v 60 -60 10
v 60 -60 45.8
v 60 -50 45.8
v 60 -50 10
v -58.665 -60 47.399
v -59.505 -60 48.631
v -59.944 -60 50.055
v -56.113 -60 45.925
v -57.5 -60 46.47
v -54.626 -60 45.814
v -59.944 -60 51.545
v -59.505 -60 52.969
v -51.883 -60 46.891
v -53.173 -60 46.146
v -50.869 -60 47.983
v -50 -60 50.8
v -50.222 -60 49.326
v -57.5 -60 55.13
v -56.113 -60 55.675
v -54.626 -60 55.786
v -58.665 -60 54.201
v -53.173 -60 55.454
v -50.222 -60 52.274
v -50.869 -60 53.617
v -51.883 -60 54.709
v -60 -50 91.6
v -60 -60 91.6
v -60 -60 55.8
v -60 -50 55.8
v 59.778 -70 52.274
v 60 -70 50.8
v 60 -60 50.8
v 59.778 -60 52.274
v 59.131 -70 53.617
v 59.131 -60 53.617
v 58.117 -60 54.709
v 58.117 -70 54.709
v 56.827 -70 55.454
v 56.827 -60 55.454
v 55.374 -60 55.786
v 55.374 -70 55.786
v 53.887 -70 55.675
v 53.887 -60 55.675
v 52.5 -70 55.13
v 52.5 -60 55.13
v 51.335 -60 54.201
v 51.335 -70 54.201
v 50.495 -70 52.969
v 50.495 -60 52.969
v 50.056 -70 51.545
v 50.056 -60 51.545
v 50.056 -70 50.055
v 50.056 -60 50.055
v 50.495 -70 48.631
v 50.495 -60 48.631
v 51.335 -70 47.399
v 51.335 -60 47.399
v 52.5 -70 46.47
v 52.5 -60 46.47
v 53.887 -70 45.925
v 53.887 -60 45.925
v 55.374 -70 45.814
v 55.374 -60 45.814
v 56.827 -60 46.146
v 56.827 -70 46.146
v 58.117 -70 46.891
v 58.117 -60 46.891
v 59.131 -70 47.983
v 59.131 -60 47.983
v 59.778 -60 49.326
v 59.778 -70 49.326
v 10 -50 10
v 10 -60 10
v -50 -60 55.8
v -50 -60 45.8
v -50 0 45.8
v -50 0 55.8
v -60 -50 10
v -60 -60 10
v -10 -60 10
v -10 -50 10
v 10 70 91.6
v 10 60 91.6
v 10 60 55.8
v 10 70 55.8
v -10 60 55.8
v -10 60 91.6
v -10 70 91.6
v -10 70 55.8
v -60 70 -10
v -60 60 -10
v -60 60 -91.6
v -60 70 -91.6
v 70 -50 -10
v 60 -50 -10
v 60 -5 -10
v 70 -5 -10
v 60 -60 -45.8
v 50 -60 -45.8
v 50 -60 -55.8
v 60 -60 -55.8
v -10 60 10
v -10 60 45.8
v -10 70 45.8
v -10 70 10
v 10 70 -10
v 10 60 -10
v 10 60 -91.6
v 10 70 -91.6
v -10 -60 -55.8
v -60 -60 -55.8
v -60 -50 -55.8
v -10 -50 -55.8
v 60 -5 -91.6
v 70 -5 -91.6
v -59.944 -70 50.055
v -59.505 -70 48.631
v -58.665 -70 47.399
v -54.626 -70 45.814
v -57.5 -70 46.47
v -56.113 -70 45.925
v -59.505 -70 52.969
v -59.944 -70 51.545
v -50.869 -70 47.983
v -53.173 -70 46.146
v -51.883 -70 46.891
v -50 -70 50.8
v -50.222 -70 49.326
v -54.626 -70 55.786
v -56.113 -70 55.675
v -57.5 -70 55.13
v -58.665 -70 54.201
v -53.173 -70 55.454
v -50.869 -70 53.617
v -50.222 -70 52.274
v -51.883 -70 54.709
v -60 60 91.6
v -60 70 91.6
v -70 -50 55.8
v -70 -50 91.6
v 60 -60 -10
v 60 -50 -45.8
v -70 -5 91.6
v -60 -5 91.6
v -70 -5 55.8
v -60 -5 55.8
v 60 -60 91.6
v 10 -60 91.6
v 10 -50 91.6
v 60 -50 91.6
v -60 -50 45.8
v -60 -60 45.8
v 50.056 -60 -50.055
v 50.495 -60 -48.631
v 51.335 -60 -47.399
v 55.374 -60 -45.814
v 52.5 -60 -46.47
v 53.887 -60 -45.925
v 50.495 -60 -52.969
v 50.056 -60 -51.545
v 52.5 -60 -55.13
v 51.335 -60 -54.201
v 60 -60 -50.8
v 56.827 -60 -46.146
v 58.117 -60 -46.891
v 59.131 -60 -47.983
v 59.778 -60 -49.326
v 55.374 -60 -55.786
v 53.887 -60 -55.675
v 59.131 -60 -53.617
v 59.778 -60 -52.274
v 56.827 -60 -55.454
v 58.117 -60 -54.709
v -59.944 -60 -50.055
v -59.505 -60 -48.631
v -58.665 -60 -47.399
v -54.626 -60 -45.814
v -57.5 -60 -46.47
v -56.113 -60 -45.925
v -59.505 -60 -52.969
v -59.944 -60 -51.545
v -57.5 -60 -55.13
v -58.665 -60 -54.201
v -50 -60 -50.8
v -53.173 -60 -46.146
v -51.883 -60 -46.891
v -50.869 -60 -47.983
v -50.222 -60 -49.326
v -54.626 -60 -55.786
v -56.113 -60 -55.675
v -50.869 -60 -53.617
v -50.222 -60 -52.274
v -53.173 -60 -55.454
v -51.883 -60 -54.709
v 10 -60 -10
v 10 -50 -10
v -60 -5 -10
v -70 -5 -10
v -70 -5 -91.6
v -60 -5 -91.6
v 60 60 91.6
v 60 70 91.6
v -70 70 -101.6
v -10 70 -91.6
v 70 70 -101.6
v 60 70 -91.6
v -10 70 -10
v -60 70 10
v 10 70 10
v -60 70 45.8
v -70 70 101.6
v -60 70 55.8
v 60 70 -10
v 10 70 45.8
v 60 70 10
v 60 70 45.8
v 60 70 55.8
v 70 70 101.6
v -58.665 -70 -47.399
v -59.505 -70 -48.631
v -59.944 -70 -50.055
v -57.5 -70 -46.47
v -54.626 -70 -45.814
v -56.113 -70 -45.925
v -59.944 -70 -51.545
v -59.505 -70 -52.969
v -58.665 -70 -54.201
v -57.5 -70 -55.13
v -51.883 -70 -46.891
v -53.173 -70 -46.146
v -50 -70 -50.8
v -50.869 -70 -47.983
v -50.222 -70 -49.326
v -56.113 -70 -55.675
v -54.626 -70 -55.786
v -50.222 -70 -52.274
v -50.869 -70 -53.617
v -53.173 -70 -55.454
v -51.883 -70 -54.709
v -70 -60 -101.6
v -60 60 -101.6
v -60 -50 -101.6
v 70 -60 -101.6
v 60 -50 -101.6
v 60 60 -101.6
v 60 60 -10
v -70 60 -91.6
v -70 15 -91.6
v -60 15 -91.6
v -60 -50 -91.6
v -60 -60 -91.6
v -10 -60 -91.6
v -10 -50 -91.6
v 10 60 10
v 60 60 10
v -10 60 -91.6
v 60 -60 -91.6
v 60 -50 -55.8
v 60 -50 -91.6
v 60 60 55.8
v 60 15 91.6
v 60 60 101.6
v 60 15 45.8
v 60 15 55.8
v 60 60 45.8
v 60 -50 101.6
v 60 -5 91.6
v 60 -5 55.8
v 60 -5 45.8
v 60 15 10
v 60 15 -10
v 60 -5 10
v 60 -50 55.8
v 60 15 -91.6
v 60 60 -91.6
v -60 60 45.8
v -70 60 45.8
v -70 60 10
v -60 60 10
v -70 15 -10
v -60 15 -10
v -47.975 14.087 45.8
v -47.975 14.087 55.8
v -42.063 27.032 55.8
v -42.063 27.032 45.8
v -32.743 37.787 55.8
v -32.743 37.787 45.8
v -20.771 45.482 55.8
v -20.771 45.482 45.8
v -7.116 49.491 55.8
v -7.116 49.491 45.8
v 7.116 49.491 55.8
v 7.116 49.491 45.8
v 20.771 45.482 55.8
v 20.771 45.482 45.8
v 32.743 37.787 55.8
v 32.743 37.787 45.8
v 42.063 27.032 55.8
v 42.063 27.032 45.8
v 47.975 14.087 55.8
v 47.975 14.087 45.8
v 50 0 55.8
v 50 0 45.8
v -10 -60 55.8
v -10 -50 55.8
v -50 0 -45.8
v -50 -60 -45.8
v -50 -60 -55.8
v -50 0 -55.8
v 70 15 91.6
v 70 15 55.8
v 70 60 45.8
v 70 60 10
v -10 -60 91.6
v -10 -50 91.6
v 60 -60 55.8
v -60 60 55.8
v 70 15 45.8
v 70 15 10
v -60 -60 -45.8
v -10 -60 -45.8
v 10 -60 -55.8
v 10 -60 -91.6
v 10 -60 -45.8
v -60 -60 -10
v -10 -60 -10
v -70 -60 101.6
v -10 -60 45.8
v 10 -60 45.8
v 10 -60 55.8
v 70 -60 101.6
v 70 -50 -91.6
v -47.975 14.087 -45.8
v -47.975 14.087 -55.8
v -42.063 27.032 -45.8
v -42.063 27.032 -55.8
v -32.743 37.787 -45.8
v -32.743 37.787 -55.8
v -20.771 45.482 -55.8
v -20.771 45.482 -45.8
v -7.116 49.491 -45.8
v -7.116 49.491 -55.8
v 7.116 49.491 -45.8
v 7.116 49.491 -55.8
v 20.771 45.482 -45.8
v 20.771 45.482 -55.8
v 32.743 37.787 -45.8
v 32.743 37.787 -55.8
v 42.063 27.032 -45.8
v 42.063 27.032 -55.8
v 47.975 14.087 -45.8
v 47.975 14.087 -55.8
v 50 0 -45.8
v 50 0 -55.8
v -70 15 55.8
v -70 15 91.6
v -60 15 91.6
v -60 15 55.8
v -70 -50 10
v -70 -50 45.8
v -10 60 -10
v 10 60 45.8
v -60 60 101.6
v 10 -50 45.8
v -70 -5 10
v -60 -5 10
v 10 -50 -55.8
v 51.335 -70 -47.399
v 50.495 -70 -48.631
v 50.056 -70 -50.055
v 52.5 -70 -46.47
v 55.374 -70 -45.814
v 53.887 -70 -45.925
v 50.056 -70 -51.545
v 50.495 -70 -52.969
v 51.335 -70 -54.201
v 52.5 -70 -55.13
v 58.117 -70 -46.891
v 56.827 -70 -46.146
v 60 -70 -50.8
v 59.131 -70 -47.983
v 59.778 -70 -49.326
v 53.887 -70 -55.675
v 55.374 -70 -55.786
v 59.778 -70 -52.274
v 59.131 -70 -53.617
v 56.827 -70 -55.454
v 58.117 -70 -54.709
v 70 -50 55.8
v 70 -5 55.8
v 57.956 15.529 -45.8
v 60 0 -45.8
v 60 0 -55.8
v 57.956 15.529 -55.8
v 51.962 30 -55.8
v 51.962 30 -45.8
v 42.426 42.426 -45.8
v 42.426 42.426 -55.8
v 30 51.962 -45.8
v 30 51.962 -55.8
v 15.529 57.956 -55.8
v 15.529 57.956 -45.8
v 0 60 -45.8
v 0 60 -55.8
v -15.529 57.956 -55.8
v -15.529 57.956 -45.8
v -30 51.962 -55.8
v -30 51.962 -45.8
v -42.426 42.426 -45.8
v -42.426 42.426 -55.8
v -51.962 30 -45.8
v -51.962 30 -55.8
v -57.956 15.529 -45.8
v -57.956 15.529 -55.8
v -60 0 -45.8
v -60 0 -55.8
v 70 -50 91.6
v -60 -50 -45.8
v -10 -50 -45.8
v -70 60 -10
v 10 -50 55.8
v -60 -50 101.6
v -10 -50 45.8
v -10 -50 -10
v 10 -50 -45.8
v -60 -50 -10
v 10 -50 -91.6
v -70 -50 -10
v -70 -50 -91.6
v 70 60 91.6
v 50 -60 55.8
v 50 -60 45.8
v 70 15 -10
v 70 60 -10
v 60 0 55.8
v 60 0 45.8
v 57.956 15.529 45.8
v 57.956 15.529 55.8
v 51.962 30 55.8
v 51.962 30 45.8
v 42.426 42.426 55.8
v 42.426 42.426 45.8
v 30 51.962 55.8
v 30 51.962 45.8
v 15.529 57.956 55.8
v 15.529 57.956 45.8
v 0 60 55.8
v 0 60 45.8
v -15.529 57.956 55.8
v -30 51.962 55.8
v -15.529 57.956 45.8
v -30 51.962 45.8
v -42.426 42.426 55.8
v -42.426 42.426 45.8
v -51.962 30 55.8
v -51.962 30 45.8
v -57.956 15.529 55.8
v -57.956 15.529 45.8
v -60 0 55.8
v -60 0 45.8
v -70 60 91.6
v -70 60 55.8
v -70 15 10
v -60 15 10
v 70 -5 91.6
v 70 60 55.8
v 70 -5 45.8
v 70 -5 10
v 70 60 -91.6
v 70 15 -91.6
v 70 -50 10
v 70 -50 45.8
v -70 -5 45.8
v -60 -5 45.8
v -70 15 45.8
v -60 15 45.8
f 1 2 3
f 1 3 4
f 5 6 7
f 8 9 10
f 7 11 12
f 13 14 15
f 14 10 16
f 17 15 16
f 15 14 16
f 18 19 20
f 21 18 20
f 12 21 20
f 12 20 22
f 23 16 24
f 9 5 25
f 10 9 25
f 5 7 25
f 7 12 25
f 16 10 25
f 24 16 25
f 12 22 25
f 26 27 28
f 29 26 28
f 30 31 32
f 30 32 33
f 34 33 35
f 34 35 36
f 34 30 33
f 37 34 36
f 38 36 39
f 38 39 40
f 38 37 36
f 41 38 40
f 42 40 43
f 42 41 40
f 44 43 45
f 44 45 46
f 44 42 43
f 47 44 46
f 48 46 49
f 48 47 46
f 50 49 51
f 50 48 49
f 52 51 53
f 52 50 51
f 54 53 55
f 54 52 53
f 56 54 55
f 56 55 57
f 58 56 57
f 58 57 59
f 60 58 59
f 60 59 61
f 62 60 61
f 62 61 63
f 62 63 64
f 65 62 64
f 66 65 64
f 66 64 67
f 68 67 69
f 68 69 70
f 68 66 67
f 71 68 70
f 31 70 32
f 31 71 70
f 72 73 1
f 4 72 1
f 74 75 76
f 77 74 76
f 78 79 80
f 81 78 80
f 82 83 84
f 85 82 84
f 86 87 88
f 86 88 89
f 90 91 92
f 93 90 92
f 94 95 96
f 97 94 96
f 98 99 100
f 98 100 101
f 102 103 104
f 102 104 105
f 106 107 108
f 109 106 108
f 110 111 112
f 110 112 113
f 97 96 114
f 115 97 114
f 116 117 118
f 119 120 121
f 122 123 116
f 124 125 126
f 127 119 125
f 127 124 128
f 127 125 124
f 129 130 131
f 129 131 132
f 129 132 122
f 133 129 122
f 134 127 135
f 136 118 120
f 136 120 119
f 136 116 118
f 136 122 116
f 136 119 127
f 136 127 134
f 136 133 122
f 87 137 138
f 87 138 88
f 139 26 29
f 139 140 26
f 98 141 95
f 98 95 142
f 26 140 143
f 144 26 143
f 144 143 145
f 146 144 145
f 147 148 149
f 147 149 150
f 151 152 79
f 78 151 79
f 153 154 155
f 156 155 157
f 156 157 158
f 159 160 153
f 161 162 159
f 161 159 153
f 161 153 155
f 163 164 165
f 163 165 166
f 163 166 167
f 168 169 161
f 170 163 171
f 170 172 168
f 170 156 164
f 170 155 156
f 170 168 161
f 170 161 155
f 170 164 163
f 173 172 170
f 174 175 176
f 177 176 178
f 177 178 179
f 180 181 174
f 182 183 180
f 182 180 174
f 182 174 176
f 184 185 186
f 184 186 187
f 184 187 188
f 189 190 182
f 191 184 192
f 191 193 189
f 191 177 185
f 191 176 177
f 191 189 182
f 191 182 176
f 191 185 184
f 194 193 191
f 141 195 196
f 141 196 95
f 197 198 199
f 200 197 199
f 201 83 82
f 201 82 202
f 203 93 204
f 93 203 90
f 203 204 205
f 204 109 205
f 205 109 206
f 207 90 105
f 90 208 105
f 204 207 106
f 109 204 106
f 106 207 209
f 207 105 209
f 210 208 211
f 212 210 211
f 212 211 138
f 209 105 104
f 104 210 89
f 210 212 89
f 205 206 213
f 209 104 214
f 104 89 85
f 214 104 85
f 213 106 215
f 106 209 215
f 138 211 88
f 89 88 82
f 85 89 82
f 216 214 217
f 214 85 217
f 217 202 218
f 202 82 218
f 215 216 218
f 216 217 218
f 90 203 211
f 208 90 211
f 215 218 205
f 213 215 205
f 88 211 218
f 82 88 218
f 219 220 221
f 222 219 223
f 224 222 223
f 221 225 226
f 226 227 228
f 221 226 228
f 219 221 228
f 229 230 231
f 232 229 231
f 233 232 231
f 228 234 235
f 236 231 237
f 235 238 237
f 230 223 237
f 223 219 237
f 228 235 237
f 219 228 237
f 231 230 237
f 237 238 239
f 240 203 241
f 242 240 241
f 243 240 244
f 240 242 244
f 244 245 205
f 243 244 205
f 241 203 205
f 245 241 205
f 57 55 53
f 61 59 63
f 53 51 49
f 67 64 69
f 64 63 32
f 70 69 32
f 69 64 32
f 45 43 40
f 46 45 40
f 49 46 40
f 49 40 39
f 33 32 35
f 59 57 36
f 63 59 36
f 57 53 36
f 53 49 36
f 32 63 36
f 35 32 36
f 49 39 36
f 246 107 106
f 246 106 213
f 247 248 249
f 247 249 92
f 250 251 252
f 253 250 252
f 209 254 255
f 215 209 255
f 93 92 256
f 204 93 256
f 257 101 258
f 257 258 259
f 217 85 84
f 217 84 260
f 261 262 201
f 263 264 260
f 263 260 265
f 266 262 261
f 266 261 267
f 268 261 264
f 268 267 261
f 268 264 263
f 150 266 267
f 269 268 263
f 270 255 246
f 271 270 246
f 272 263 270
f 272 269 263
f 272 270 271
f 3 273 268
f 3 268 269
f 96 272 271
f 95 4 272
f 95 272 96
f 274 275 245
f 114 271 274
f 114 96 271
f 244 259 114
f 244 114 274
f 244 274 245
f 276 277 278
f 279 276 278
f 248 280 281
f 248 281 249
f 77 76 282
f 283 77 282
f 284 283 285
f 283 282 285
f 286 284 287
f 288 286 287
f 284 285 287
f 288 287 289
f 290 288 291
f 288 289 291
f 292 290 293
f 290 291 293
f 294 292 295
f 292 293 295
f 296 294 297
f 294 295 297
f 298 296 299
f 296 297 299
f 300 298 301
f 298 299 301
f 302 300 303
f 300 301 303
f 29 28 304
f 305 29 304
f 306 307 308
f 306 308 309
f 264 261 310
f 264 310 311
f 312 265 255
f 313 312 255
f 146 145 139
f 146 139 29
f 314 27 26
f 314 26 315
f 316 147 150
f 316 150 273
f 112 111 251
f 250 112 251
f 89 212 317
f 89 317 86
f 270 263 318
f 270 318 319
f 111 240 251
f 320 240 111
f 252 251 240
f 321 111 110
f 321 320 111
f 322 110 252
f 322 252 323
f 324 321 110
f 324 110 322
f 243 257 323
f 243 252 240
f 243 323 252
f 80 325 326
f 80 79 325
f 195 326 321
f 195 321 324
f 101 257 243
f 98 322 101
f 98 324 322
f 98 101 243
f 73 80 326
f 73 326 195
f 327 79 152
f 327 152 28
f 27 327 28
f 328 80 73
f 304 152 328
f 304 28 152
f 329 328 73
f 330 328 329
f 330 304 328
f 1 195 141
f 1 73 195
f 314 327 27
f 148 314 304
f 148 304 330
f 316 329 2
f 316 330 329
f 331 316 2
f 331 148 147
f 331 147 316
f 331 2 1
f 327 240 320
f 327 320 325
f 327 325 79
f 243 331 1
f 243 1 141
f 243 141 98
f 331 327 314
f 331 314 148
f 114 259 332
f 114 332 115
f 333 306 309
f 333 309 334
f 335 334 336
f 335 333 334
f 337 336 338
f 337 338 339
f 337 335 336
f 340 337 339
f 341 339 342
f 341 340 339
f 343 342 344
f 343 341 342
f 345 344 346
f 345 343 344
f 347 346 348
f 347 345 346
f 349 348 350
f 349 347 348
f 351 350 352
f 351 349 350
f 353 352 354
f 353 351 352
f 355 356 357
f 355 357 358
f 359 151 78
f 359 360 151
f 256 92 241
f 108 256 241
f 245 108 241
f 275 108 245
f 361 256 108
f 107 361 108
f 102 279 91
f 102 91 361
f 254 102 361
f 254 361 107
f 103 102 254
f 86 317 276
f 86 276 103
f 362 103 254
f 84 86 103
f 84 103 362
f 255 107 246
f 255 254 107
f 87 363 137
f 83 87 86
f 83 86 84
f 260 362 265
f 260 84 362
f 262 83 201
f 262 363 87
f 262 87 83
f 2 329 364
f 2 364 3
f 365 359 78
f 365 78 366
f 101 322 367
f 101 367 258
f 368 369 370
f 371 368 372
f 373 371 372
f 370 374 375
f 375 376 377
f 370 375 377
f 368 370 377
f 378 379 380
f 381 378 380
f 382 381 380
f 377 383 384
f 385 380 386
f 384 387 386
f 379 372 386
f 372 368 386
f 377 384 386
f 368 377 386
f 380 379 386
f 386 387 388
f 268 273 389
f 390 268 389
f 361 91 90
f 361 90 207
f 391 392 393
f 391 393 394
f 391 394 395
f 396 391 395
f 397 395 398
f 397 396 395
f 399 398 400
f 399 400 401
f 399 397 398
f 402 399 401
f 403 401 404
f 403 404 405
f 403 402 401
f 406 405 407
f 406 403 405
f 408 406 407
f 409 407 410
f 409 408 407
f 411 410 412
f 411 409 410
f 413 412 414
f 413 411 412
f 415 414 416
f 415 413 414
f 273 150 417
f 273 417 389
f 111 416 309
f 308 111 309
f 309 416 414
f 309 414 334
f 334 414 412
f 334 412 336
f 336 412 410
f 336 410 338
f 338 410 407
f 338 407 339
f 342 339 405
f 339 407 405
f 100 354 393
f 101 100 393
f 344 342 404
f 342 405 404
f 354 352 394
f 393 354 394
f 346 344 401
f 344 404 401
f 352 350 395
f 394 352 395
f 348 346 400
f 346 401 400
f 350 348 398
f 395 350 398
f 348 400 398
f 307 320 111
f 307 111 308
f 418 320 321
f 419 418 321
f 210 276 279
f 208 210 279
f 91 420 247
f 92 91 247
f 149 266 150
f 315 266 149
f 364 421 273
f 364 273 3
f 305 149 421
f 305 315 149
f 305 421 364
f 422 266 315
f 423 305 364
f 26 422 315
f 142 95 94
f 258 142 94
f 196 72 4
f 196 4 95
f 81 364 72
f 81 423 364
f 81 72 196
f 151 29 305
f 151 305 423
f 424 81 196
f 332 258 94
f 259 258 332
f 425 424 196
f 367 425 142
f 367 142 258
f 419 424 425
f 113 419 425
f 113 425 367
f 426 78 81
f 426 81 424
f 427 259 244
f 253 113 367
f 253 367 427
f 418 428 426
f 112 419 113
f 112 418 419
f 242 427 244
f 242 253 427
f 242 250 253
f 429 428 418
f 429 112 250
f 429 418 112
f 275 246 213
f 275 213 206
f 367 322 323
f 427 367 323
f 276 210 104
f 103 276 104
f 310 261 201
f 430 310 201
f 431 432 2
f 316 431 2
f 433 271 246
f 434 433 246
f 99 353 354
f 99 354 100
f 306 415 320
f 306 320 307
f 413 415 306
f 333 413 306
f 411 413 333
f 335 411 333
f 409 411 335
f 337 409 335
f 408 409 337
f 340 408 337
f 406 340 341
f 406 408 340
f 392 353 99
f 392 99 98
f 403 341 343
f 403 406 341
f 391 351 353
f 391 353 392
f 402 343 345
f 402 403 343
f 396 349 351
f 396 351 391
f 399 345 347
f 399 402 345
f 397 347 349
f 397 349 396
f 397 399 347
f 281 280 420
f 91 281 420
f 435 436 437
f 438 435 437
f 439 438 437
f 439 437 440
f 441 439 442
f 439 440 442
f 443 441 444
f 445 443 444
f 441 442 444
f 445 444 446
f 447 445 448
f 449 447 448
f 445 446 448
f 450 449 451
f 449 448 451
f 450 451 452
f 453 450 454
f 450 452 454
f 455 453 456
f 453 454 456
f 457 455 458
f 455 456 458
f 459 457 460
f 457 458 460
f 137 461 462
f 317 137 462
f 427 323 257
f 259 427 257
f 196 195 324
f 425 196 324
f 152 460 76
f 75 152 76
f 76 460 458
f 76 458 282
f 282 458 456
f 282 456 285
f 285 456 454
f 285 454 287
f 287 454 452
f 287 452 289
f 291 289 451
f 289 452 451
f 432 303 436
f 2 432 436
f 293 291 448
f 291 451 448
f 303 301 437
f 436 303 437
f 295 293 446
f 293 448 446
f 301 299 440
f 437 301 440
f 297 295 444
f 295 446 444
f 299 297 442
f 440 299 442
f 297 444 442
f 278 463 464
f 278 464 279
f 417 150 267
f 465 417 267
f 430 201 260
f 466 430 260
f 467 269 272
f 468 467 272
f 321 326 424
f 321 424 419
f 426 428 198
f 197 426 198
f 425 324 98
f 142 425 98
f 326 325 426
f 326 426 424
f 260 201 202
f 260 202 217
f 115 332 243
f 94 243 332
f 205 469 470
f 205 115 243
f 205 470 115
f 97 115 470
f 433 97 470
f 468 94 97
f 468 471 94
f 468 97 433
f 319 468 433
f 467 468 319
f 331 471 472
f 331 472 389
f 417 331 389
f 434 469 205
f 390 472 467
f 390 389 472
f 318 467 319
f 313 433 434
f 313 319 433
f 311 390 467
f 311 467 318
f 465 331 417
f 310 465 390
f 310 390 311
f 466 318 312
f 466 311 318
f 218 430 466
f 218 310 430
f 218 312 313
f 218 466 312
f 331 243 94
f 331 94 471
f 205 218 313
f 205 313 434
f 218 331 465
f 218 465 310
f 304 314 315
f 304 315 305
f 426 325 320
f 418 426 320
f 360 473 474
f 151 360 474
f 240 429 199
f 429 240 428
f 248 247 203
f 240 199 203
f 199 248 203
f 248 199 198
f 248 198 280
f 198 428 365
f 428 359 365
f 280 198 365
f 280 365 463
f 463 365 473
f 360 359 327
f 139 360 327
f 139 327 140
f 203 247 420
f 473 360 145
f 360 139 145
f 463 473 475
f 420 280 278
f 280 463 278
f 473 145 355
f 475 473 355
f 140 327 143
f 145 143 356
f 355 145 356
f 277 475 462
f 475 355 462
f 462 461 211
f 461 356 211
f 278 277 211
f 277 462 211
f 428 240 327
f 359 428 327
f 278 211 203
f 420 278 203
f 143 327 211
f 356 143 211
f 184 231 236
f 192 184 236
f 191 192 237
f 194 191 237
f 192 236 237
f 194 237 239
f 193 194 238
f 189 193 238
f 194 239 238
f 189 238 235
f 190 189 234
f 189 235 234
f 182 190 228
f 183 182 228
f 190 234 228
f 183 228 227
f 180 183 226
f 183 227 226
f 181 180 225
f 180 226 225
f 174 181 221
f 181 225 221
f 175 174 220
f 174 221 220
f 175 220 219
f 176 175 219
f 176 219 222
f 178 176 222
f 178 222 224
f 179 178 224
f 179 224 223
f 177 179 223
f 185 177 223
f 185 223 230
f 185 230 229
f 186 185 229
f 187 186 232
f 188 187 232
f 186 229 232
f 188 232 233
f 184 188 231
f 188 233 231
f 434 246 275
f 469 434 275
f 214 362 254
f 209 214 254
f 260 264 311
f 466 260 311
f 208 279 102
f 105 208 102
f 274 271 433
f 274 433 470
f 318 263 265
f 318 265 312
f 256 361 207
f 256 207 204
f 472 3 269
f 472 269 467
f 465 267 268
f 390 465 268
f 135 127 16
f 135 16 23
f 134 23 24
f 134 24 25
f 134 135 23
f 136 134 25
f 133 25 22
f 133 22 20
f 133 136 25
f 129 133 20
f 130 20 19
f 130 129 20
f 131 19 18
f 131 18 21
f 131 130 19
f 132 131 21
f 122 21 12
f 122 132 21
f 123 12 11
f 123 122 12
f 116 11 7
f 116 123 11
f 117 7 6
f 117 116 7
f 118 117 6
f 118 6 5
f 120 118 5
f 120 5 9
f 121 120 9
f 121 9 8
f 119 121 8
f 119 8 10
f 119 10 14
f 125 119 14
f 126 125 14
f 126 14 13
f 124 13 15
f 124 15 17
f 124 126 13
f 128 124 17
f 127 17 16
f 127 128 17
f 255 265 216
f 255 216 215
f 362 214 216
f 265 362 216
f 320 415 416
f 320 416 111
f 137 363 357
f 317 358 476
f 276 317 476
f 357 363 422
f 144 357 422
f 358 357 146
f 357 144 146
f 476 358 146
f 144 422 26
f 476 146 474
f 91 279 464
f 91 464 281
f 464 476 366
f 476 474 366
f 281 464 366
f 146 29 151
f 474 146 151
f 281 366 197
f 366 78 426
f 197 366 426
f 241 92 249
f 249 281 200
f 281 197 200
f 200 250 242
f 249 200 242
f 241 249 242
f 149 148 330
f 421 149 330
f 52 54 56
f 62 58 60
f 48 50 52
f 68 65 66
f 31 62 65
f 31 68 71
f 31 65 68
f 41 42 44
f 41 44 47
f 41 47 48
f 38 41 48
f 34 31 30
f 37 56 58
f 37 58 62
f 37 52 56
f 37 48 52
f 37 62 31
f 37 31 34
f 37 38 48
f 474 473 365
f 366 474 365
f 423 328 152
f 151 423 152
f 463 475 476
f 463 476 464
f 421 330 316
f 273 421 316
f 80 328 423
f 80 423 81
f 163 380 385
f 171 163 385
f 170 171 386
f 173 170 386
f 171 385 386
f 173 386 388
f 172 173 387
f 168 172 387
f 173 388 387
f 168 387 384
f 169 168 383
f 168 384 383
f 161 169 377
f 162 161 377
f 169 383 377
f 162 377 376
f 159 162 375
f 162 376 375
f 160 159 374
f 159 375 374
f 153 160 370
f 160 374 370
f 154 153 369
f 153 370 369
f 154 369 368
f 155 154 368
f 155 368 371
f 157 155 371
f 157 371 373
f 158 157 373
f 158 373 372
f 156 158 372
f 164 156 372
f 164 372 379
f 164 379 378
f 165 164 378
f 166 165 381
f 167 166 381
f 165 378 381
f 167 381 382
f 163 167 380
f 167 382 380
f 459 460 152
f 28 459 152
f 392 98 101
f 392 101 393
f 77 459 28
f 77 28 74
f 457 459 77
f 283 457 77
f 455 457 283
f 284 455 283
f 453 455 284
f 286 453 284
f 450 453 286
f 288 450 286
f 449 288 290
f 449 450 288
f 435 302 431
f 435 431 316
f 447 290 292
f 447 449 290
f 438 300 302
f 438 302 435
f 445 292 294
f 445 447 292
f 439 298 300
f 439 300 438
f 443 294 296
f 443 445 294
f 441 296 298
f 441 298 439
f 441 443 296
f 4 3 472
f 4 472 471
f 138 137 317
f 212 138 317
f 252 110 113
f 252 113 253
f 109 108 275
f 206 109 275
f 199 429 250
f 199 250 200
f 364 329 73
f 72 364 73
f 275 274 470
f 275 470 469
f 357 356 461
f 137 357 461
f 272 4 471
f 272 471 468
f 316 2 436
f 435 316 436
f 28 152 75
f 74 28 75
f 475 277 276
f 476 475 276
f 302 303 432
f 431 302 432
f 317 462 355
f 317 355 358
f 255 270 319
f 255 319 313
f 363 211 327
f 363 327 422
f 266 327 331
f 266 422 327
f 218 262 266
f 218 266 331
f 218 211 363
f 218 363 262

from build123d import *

# Parameters (mm, degrees)
CHASSIS_FRAME_SKETCH_W  = 140
CHASSIS_FRAME_SKETCH_H  = 130
CHASSIS_FRAME_DEPTH     = 101.6
U_BOLT_1_DEPTH          = 5
SKETCH20_R              = 5
U_BOLTS_BOLTS_1_DEPTH   = 10
U_BOLTS_BOLTS_1_2_DEPTH = 10
CUT_EXTRUDE2_DEPTH      = 187.608038412
CUT_EXTRUDE2_DEPTH_BACK = 187.608038412
SKETCH21_W              = 50
SKETCH21_H              = 81.6
CUT_EXTRUDE3_DEPTH      = 187.608038412
CUT_EXTRUDE3_DEPTH_BACK = 187.608038412
SKETCH22_W              = 81.6
SKETCH22_H              = 45
SKETCH23_W              = 50
SKETCH23_H              = 10
BOSS_EXTRUDE10_DEPTH    = 10
BOSS_EXTRUDE11_DEPTH    = 10
SKETCH25_W              = 140
SKETCH25_H              = 130
SKETCH25_W_2            = 120
SKETCH25_H_2            = 110
BOSS_EXTRUDE12_DEPTH    = 5


with BuildPart() as part:
    # Chassis Frame Sketch → Chassis Frame (new, symmetric)
    with BuildSketch(Plane.XY):
        with Locations((0, 5)):
            Rectangle(CHASSIS_FRAME_SKETCH_W, CHASSIS_FRAME_SKETCH_H)
        Polygon((-60, -50), (-60, 60), (60, 60), (60, -50), (50, -50), (-5.1e-08, -50), (-50, -50), align=None, mode=Mode.SUBTRACT)
    extrude(amount=CHASSIS_FRAME_DEPTH, both=True)

    # Sketch21 → Cut-Extrude2 (cut, two sides: drawn at the far end of the back side and taken through both)
    with BuildSketch(Plane(origin=(0, 70, 0), x_dir=(1, 0, 0), z_dir=(0, 1, 0)).offset(-CUT_EXTRUDE2_DEPTH_BACK)):
        with Locations((-35, 50.8)):
            Rectangle(SKETCH21_W, SKETCH21_H)
        with Locations((35, 50.8)):
            Rectangle(SKETCH21_W, SKETCH21_H)
        with Locations((-35, -50.8)):
            Rectangle(SKETCH21_W, SKETCH21_H)
        with Locations((35, -50.8)):
            Rectangle(SKETCH21_W, SKETCH21_H)
    extrude(amount=CUT_EXTRUDE2_DEPTH + CUT_EXTRUDE2_DEPTH_BACK, mode=Mode.SUBTRACT)

    # Sketch22 → Cut-Extrude3 (cut, two sides: drawn at the far end of the back side and taken through both)
    with BuildSketch(Plane(origin=(70, 0, 0), x_dir=(0, 0, -1), z_dir=(1, 0, 0)).offset(-CUT_EXTRUDE3_DEPTH_BACK)):
        with Locations((-50.8, 37.5)):
            Rectangle(SKETCH22_W, SKETCH22_H)
        with Locations((50.8, 37.5)):
            Rectangle(SKETCH22_W, SKETCH22_H)
        with Locations((-50.8, -27.5)):
            Rectangle(SKETCH22_W, SKETCH22_H)
        with Locations((50.8, -27.5)):
            Rectangle(SKETCH22_W, SKETCH22_H)
    extrude(amount=CUT_EXTRUDE3_DEPTH + CUT_EXTRUDE3_DEPTH_BACK, mode=Mode.SUBTRACT)

    # Sketch23 → Boss-Extrude10 (add)
    with BuildSketch(Plane(origin=(0, -60, 0), x_dir=(1, 0, 0), z_dir=(0, 1, 0))):
        with Locations((-35, -50.8)):
            Rectangle(SKETCH23_W, SKETCH23_H)
        with Locations((35, -50.8)):
            Rectangle(SKETCH23_W, SKETCH23_H)
    extrude(amount=BOSS_EXTRUDE10_DEPTH)

    # Sketch24 → Boss-Extrude11 (add)
    with BuildSketch(Plane(origin=(0, -60, 0), x_dir=(1, 0, 0), z_dir=(0, 1, 0))):
        Polygon((-60, 55.8), (-60, 45.8), (60, 45.8), (60, 55.8), (10, 55.8), (-10, 55.8), align=None)
    extrude(amount=BOSS_EXTRUDE11_DEPTH)

    # Sketch25 → Boss-Extrude12 (add, symmetric)
    with BuildSketch(Plane.XY.offset(50.8)):
        with Locations((0, 5)):
            Rectangle(SKETCH25_W, SKETCH25_H)
        with Locations((0, 5)):
            Rectangle(SKETCH25_W_2, SKETCH25_H_2, mode=Mode.SUBTRACT)
    extrude(amount=BOSS_EXTRUDE12_DEPTH, both=True)


with BuildPart() as body_2:
    # U Bolt Sketch → U Bolt 1 (new, symmetric)
    with BuildSketch(Plane.XY.offset(50.8)):
        with BuildLine():
            ThreePointArc((-50, 0), (0, 50), (50, 0))
            Line((50, 0), (50, -60))
            Line((50, -60), (60, -60))
            Line((60, -60), (60, 0))
            ThreePointArc((60, 0), (0, 60), (-60, 0))
            Line((-60, 0), (-60, -60))
            Line((-60, -60), (-50, -60))
            Line((-50, -60), (-50, 0))
        make_face()
    extrude(amount=U_BOLT_1_DEPTH, both=True)


with BuildPart() as body_3:
    # U Bolt 2: mirrored copy
    add(body_2.part.mirror(Plane.XY))


with BuildPart() as body_4:
    # Sketch20 → U Bolts Bolts 1 (new body)
    with BuildSketch(Plane(origin=(0, -70, 0), x_dir=(-1, 0, 0), z_dir=(0, -1, 0))):
        with Locations((55, -50.8)):
            Circle(SKETCH20_R)
    extrude(amount=-U_BOLTS_BOLTS_1_DEPTH)


with BuildPart() as body_5:
    # Sketch20 → U Bolts Bolts 1 2 (new body)
    with BuildSketch(Plane(origin=(0, -70, 0), x_dir=(-1, 0, 0), z_dir=(0, -1, 0))):
        with Locations((-55, -50.8)):
            Circle(SKETCH20_R)
    extrude(amount=-U_BOLTS_BOLTS_1_2_DEPTH)


with BuildPart() as body_6:
    # U Bolts Bolts 2: mirrored copy
    add(body_4.part.mirror(Plane.XY))


with BuildPart() as body_7:
    # U Bolts Bolts 2 2: mirrored copy
    add(body_5.part.mirror(Plane.XY))


solid = Compound([part.part, body_2.part, body_3.part, body_4.part, body_5.part, body_6.part, body_7.part])
